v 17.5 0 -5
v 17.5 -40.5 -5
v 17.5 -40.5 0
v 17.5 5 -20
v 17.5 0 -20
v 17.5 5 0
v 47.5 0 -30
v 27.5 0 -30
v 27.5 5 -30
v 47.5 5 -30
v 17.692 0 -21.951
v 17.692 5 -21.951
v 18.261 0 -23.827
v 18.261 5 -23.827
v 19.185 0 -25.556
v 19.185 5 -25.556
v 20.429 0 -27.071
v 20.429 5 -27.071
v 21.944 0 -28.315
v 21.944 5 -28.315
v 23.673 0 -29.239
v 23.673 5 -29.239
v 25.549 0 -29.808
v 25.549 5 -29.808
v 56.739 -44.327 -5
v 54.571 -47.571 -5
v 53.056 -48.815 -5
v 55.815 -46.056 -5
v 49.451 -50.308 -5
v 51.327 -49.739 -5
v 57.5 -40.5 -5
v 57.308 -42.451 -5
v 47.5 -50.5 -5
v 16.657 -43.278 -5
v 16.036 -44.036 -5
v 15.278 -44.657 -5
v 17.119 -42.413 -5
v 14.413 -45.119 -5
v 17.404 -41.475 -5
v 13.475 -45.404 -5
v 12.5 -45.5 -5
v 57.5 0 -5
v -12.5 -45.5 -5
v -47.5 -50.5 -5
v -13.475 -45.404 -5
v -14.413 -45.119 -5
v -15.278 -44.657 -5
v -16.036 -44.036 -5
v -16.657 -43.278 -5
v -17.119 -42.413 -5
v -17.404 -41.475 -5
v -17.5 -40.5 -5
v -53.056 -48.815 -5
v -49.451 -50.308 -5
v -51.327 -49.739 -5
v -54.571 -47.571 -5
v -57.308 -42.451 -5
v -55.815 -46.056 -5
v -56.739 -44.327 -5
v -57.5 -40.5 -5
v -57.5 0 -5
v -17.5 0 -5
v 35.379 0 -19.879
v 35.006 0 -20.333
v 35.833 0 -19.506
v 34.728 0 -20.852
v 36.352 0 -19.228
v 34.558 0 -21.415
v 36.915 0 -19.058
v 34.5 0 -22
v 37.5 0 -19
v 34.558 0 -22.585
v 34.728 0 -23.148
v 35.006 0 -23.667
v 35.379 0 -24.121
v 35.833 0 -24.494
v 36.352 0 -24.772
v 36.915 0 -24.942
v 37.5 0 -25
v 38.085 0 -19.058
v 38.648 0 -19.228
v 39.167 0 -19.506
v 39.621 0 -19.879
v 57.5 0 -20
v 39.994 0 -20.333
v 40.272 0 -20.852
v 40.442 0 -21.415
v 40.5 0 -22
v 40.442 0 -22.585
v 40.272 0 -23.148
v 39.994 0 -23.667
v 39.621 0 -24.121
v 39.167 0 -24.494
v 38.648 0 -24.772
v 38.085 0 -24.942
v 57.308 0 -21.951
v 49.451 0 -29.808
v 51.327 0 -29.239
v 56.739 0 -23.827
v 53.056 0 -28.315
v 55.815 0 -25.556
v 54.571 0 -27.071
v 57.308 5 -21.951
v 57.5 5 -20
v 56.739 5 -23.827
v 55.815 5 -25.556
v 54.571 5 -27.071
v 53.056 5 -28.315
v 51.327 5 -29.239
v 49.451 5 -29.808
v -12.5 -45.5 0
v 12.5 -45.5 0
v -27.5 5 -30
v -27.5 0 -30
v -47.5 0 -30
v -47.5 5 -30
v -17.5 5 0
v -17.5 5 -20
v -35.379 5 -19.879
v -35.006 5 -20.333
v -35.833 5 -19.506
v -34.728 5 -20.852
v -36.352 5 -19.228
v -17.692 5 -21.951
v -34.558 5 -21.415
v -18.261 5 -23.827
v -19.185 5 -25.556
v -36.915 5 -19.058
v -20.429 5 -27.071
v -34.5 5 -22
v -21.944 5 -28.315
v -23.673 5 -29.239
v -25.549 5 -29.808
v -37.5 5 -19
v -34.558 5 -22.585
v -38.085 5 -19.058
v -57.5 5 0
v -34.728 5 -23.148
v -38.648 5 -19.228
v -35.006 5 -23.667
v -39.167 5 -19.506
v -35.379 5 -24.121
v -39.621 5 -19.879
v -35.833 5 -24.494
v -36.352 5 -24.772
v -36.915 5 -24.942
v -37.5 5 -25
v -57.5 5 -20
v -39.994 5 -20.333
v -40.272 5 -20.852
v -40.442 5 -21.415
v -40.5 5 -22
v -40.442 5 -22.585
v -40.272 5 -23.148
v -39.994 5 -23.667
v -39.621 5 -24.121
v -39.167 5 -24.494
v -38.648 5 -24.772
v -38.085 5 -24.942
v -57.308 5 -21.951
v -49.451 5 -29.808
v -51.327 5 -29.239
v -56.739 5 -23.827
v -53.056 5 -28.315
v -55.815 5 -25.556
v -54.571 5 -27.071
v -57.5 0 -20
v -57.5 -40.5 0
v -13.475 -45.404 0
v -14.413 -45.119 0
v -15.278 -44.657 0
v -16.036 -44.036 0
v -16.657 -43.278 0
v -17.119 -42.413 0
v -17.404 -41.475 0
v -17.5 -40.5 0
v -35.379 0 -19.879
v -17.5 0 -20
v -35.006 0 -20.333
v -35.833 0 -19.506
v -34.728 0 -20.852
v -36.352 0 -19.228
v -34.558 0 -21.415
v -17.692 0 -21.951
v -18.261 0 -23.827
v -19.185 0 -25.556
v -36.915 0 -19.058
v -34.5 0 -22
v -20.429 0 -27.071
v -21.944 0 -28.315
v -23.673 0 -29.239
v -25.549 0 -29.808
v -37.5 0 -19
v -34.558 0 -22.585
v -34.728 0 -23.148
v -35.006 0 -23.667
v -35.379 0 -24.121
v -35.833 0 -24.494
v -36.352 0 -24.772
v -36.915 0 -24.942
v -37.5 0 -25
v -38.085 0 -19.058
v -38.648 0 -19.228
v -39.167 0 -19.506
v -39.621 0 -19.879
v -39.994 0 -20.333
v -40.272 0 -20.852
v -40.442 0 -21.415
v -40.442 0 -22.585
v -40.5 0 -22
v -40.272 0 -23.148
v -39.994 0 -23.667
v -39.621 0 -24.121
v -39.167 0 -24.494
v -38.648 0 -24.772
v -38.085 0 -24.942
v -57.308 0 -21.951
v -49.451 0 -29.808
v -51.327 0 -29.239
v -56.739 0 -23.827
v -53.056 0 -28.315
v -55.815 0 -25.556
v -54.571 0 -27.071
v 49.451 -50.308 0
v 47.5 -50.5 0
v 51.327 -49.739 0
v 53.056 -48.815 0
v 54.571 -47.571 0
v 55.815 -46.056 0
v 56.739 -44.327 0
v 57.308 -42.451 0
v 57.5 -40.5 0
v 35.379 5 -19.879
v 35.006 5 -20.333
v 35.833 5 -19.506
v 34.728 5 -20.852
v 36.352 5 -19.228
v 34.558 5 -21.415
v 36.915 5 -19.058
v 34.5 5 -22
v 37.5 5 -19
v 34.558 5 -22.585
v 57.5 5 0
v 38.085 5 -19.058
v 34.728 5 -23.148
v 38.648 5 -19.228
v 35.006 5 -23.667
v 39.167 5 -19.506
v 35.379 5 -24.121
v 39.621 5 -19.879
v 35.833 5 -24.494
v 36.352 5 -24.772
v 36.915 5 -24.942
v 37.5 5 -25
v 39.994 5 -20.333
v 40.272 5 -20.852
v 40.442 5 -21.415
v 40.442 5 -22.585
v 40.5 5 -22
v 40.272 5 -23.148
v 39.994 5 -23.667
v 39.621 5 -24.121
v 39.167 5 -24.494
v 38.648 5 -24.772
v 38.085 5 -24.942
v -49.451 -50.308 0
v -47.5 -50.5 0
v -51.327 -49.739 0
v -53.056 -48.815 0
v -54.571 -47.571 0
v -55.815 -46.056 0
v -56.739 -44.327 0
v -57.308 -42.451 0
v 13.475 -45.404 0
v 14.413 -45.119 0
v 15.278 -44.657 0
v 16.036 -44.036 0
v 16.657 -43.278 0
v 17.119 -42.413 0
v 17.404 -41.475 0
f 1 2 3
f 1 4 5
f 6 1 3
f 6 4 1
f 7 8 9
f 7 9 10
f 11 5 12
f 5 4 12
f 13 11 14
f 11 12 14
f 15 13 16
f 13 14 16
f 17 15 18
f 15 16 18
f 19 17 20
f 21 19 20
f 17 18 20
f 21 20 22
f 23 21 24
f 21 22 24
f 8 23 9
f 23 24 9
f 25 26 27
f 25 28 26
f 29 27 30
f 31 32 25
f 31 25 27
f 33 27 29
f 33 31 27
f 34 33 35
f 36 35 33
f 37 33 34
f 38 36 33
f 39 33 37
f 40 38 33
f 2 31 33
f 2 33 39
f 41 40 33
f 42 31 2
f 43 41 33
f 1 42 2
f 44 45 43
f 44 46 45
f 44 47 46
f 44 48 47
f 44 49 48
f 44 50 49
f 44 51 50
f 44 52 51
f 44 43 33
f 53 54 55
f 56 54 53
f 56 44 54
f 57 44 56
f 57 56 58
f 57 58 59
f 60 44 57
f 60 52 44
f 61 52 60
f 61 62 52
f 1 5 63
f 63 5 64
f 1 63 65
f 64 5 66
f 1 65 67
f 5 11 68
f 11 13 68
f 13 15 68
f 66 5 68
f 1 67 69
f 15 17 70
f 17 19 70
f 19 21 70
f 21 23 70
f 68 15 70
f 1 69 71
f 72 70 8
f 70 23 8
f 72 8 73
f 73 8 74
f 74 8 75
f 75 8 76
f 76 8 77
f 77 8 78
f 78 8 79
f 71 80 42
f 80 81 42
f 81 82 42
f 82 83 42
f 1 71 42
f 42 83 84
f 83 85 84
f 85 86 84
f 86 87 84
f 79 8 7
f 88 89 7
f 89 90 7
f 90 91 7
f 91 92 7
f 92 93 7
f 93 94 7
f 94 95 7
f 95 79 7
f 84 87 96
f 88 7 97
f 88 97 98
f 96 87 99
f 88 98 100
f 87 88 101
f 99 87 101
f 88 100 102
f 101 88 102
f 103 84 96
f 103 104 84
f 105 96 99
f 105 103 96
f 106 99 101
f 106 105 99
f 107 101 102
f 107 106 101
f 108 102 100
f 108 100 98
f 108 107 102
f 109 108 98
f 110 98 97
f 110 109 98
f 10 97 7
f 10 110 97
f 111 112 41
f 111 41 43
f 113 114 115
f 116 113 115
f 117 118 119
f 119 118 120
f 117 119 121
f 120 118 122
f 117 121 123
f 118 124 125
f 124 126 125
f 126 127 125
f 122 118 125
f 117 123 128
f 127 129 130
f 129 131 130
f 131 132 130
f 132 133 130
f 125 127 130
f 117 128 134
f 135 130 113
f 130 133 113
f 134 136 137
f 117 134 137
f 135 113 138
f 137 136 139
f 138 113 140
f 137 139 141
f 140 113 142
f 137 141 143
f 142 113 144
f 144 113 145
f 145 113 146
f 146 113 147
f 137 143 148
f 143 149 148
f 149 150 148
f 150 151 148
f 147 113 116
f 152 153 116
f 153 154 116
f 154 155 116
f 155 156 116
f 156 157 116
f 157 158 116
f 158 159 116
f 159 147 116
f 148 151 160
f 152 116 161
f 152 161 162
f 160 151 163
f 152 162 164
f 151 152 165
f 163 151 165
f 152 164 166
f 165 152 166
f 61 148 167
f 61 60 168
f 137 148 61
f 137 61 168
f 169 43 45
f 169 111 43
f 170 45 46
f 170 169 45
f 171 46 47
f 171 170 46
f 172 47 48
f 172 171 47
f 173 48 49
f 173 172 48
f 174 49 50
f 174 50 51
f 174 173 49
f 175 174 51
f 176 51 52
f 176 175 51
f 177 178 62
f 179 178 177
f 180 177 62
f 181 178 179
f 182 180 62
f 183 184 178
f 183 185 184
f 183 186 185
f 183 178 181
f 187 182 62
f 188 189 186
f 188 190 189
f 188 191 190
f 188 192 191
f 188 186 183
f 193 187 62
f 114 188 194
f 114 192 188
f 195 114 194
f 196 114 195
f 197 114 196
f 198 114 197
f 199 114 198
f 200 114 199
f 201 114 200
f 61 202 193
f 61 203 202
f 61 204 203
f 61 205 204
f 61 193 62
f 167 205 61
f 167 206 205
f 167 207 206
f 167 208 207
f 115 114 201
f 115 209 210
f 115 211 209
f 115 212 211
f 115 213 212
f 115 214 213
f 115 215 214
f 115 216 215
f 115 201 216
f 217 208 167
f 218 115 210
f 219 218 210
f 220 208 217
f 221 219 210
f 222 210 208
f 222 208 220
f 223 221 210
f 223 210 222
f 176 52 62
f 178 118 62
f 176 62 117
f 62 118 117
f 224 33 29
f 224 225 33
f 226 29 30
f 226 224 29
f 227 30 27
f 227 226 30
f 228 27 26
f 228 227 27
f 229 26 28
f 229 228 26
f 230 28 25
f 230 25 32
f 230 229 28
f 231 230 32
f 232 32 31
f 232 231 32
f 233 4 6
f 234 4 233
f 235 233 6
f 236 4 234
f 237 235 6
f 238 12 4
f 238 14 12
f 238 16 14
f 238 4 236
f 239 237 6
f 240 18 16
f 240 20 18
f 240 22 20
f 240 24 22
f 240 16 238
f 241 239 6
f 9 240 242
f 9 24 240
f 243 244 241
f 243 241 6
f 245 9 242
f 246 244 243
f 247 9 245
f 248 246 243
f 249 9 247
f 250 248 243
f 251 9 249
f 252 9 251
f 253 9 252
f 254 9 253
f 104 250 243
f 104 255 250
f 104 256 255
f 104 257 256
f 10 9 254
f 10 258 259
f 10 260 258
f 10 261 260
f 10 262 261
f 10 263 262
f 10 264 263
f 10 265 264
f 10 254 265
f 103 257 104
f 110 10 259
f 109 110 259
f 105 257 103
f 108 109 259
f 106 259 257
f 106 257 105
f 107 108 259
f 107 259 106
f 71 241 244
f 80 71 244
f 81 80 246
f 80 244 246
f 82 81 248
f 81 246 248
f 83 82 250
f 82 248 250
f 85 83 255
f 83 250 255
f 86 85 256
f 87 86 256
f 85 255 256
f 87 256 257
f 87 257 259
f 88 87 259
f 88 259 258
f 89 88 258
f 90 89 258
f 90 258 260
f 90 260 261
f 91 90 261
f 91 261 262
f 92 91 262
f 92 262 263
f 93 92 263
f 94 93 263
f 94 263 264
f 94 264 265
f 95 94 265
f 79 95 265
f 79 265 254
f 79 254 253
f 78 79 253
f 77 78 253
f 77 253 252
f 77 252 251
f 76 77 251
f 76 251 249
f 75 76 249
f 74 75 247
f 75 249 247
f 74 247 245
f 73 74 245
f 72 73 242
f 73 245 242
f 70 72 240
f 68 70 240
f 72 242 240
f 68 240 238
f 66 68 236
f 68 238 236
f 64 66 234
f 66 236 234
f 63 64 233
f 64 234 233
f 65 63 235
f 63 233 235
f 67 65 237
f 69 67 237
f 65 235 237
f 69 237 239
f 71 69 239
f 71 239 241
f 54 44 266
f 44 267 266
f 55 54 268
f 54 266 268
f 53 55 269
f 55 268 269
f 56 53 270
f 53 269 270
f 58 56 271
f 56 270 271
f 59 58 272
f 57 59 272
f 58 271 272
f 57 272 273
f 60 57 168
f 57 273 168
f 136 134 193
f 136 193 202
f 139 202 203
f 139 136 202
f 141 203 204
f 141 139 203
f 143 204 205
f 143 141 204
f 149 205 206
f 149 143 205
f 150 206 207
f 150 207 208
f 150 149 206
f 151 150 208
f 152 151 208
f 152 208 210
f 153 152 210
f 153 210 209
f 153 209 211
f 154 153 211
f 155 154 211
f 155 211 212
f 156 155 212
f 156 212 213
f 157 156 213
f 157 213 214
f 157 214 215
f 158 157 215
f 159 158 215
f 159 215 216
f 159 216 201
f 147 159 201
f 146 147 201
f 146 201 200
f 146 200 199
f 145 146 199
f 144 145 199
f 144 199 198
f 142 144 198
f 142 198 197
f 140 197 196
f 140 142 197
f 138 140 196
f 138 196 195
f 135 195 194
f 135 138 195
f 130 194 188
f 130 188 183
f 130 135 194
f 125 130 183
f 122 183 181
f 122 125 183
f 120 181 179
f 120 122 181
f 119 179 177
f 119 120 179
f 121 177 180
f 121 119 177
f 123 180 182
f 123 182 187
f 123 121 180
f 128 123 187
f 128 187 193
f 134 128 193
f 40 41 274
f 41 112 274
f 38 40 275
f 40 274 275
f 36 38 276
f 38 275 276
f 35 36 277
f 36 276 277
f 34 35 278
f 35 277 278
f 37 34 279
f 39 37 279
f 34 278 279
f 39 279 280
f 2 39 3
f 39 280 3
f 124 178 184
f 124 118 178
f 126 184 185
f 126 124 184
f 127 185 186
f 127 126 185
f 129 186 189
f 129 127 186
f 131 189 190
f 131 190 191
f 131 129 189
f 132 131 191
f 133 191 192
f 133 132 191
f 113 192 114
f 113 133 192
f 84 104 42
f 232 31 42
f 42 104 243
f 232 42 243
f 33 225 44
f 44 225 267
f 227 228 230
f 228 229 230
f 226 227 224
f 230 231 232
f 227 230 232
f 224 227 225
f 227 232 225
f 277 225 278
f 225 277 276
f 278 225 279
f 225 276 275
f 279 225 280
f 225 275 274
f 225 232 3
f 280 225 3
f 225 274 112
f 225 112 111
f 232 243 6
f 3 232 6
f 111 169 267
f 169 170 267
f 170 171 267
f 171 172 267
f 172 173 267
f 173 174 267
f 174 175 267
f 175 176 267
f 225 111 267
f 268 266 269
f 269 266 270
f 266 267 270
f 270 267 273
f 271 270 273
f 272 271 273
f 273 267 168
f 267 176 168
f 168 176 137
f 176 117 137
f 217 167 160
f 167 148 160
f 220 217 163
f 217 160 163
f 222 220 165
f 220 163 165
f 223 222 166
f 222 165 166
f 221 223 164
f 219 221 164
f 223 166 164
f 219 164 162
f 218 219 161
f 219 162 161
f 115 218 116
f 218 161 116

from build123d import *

# Parameters (mm, degrees)
SKETCH1_W           = 40
SKETCH1_H           = 30
BOSS_EXTRUDE1_DEPTH = 5
SKETCH2_W           = 40
SKETCH2_H           = 5
BOSS_EXTRUDE2_DEPTH = 45.5
SKETCH3_W           = 57.5
SKETCH3_H           = 5
BOSS_EXTRUDE3_DEPTH = 5
FILLET1_R           = 10
FILLET2_R           = 5
FILLET3_R           = 10
SKETCH4_R           = 3
CUT_EXTRUDE1_DEPTH  = 86.36099812


with BuildPart() as part:
    # Sketch1 → Boss-Extrude1 (new body)
    with BuildSketch(Plane(origin=(0, 0, 0), x_dir=(1, 0, 0), z_dir=(0, 1, 0))):
        with Locations((37.5, 15)):
            Rectangle(SKETCH1_W, SKETCH1_H)
    extrude(amount=BOSS_EXTRUDE1_DEPTH)

    # Sketch2 → Boss-Extrude2 (add)
    with BuildSketch(Plane.XZ):
        with Locations((37.5, -2.5)):
            Rectangle(SKETCH2_W, SKETCH2_H)
    extrude(amount=BOSS_EXTRUDE2_DEPTH)

    # Sketch3 → Boss-Extrude3 (add)
    with BuildSketch(Plane.XZ.offset(45.5)):
        with Locations((28.75, -2.5)):
            Rectangle(SKETCH3_W, SKETCH3_H)
    extrude(amount=BOSS_EXTRUDE3_DEPTH)

    # Fillet1
    fillet1_edges = [part.edges().sort_by_distance(p)[0] for p in [
        (57.5, -50.5, -2.5),
    ]]
    fillet(fillet1_edges, radius=FILLET1_R)

    # Fillet2
    fillet2_edges = [part.edges().sort_by_distance(p)[0] for p in [
        (17.5, -45.5, -2.5),
    ]]
    fillet(fillet2_edges, radius=FILLET2_R)

    # Fillet3
    fillet3_edges = [part.edges().sort_by_distance(p)[0] for p in [
        (17.5, 2.5, -30),
        (57.5, 2.5, -30),
    ]]
    fillet(fillet3_edges, radius=FILLET3_R)

    # Sketch4 → Cut-Extrude1 (cut, through all)
    with BuildSketch(Plane(origin=(0, 5, 0), x_dir=(1, 0, 0), z_dir=(0, 1, 0))):
        with Locations(Location((37.5, 22, 0), (0, 0, 270))):
            Circle(SKETCH4_R)
    extrude(amount=-CUT_EXTRUDE1_DEPTH, mode=Mode.SUBTRACT)

    # Mirror1: part across plane


with BuildPart() as part_1:
    add(part.part)
    add(part.part.mirror(Plane(origin=(0, 0, 0), x_dir=(0, 0, 1), z_dir=(1, 0, 0))))


solid = part_1.part
